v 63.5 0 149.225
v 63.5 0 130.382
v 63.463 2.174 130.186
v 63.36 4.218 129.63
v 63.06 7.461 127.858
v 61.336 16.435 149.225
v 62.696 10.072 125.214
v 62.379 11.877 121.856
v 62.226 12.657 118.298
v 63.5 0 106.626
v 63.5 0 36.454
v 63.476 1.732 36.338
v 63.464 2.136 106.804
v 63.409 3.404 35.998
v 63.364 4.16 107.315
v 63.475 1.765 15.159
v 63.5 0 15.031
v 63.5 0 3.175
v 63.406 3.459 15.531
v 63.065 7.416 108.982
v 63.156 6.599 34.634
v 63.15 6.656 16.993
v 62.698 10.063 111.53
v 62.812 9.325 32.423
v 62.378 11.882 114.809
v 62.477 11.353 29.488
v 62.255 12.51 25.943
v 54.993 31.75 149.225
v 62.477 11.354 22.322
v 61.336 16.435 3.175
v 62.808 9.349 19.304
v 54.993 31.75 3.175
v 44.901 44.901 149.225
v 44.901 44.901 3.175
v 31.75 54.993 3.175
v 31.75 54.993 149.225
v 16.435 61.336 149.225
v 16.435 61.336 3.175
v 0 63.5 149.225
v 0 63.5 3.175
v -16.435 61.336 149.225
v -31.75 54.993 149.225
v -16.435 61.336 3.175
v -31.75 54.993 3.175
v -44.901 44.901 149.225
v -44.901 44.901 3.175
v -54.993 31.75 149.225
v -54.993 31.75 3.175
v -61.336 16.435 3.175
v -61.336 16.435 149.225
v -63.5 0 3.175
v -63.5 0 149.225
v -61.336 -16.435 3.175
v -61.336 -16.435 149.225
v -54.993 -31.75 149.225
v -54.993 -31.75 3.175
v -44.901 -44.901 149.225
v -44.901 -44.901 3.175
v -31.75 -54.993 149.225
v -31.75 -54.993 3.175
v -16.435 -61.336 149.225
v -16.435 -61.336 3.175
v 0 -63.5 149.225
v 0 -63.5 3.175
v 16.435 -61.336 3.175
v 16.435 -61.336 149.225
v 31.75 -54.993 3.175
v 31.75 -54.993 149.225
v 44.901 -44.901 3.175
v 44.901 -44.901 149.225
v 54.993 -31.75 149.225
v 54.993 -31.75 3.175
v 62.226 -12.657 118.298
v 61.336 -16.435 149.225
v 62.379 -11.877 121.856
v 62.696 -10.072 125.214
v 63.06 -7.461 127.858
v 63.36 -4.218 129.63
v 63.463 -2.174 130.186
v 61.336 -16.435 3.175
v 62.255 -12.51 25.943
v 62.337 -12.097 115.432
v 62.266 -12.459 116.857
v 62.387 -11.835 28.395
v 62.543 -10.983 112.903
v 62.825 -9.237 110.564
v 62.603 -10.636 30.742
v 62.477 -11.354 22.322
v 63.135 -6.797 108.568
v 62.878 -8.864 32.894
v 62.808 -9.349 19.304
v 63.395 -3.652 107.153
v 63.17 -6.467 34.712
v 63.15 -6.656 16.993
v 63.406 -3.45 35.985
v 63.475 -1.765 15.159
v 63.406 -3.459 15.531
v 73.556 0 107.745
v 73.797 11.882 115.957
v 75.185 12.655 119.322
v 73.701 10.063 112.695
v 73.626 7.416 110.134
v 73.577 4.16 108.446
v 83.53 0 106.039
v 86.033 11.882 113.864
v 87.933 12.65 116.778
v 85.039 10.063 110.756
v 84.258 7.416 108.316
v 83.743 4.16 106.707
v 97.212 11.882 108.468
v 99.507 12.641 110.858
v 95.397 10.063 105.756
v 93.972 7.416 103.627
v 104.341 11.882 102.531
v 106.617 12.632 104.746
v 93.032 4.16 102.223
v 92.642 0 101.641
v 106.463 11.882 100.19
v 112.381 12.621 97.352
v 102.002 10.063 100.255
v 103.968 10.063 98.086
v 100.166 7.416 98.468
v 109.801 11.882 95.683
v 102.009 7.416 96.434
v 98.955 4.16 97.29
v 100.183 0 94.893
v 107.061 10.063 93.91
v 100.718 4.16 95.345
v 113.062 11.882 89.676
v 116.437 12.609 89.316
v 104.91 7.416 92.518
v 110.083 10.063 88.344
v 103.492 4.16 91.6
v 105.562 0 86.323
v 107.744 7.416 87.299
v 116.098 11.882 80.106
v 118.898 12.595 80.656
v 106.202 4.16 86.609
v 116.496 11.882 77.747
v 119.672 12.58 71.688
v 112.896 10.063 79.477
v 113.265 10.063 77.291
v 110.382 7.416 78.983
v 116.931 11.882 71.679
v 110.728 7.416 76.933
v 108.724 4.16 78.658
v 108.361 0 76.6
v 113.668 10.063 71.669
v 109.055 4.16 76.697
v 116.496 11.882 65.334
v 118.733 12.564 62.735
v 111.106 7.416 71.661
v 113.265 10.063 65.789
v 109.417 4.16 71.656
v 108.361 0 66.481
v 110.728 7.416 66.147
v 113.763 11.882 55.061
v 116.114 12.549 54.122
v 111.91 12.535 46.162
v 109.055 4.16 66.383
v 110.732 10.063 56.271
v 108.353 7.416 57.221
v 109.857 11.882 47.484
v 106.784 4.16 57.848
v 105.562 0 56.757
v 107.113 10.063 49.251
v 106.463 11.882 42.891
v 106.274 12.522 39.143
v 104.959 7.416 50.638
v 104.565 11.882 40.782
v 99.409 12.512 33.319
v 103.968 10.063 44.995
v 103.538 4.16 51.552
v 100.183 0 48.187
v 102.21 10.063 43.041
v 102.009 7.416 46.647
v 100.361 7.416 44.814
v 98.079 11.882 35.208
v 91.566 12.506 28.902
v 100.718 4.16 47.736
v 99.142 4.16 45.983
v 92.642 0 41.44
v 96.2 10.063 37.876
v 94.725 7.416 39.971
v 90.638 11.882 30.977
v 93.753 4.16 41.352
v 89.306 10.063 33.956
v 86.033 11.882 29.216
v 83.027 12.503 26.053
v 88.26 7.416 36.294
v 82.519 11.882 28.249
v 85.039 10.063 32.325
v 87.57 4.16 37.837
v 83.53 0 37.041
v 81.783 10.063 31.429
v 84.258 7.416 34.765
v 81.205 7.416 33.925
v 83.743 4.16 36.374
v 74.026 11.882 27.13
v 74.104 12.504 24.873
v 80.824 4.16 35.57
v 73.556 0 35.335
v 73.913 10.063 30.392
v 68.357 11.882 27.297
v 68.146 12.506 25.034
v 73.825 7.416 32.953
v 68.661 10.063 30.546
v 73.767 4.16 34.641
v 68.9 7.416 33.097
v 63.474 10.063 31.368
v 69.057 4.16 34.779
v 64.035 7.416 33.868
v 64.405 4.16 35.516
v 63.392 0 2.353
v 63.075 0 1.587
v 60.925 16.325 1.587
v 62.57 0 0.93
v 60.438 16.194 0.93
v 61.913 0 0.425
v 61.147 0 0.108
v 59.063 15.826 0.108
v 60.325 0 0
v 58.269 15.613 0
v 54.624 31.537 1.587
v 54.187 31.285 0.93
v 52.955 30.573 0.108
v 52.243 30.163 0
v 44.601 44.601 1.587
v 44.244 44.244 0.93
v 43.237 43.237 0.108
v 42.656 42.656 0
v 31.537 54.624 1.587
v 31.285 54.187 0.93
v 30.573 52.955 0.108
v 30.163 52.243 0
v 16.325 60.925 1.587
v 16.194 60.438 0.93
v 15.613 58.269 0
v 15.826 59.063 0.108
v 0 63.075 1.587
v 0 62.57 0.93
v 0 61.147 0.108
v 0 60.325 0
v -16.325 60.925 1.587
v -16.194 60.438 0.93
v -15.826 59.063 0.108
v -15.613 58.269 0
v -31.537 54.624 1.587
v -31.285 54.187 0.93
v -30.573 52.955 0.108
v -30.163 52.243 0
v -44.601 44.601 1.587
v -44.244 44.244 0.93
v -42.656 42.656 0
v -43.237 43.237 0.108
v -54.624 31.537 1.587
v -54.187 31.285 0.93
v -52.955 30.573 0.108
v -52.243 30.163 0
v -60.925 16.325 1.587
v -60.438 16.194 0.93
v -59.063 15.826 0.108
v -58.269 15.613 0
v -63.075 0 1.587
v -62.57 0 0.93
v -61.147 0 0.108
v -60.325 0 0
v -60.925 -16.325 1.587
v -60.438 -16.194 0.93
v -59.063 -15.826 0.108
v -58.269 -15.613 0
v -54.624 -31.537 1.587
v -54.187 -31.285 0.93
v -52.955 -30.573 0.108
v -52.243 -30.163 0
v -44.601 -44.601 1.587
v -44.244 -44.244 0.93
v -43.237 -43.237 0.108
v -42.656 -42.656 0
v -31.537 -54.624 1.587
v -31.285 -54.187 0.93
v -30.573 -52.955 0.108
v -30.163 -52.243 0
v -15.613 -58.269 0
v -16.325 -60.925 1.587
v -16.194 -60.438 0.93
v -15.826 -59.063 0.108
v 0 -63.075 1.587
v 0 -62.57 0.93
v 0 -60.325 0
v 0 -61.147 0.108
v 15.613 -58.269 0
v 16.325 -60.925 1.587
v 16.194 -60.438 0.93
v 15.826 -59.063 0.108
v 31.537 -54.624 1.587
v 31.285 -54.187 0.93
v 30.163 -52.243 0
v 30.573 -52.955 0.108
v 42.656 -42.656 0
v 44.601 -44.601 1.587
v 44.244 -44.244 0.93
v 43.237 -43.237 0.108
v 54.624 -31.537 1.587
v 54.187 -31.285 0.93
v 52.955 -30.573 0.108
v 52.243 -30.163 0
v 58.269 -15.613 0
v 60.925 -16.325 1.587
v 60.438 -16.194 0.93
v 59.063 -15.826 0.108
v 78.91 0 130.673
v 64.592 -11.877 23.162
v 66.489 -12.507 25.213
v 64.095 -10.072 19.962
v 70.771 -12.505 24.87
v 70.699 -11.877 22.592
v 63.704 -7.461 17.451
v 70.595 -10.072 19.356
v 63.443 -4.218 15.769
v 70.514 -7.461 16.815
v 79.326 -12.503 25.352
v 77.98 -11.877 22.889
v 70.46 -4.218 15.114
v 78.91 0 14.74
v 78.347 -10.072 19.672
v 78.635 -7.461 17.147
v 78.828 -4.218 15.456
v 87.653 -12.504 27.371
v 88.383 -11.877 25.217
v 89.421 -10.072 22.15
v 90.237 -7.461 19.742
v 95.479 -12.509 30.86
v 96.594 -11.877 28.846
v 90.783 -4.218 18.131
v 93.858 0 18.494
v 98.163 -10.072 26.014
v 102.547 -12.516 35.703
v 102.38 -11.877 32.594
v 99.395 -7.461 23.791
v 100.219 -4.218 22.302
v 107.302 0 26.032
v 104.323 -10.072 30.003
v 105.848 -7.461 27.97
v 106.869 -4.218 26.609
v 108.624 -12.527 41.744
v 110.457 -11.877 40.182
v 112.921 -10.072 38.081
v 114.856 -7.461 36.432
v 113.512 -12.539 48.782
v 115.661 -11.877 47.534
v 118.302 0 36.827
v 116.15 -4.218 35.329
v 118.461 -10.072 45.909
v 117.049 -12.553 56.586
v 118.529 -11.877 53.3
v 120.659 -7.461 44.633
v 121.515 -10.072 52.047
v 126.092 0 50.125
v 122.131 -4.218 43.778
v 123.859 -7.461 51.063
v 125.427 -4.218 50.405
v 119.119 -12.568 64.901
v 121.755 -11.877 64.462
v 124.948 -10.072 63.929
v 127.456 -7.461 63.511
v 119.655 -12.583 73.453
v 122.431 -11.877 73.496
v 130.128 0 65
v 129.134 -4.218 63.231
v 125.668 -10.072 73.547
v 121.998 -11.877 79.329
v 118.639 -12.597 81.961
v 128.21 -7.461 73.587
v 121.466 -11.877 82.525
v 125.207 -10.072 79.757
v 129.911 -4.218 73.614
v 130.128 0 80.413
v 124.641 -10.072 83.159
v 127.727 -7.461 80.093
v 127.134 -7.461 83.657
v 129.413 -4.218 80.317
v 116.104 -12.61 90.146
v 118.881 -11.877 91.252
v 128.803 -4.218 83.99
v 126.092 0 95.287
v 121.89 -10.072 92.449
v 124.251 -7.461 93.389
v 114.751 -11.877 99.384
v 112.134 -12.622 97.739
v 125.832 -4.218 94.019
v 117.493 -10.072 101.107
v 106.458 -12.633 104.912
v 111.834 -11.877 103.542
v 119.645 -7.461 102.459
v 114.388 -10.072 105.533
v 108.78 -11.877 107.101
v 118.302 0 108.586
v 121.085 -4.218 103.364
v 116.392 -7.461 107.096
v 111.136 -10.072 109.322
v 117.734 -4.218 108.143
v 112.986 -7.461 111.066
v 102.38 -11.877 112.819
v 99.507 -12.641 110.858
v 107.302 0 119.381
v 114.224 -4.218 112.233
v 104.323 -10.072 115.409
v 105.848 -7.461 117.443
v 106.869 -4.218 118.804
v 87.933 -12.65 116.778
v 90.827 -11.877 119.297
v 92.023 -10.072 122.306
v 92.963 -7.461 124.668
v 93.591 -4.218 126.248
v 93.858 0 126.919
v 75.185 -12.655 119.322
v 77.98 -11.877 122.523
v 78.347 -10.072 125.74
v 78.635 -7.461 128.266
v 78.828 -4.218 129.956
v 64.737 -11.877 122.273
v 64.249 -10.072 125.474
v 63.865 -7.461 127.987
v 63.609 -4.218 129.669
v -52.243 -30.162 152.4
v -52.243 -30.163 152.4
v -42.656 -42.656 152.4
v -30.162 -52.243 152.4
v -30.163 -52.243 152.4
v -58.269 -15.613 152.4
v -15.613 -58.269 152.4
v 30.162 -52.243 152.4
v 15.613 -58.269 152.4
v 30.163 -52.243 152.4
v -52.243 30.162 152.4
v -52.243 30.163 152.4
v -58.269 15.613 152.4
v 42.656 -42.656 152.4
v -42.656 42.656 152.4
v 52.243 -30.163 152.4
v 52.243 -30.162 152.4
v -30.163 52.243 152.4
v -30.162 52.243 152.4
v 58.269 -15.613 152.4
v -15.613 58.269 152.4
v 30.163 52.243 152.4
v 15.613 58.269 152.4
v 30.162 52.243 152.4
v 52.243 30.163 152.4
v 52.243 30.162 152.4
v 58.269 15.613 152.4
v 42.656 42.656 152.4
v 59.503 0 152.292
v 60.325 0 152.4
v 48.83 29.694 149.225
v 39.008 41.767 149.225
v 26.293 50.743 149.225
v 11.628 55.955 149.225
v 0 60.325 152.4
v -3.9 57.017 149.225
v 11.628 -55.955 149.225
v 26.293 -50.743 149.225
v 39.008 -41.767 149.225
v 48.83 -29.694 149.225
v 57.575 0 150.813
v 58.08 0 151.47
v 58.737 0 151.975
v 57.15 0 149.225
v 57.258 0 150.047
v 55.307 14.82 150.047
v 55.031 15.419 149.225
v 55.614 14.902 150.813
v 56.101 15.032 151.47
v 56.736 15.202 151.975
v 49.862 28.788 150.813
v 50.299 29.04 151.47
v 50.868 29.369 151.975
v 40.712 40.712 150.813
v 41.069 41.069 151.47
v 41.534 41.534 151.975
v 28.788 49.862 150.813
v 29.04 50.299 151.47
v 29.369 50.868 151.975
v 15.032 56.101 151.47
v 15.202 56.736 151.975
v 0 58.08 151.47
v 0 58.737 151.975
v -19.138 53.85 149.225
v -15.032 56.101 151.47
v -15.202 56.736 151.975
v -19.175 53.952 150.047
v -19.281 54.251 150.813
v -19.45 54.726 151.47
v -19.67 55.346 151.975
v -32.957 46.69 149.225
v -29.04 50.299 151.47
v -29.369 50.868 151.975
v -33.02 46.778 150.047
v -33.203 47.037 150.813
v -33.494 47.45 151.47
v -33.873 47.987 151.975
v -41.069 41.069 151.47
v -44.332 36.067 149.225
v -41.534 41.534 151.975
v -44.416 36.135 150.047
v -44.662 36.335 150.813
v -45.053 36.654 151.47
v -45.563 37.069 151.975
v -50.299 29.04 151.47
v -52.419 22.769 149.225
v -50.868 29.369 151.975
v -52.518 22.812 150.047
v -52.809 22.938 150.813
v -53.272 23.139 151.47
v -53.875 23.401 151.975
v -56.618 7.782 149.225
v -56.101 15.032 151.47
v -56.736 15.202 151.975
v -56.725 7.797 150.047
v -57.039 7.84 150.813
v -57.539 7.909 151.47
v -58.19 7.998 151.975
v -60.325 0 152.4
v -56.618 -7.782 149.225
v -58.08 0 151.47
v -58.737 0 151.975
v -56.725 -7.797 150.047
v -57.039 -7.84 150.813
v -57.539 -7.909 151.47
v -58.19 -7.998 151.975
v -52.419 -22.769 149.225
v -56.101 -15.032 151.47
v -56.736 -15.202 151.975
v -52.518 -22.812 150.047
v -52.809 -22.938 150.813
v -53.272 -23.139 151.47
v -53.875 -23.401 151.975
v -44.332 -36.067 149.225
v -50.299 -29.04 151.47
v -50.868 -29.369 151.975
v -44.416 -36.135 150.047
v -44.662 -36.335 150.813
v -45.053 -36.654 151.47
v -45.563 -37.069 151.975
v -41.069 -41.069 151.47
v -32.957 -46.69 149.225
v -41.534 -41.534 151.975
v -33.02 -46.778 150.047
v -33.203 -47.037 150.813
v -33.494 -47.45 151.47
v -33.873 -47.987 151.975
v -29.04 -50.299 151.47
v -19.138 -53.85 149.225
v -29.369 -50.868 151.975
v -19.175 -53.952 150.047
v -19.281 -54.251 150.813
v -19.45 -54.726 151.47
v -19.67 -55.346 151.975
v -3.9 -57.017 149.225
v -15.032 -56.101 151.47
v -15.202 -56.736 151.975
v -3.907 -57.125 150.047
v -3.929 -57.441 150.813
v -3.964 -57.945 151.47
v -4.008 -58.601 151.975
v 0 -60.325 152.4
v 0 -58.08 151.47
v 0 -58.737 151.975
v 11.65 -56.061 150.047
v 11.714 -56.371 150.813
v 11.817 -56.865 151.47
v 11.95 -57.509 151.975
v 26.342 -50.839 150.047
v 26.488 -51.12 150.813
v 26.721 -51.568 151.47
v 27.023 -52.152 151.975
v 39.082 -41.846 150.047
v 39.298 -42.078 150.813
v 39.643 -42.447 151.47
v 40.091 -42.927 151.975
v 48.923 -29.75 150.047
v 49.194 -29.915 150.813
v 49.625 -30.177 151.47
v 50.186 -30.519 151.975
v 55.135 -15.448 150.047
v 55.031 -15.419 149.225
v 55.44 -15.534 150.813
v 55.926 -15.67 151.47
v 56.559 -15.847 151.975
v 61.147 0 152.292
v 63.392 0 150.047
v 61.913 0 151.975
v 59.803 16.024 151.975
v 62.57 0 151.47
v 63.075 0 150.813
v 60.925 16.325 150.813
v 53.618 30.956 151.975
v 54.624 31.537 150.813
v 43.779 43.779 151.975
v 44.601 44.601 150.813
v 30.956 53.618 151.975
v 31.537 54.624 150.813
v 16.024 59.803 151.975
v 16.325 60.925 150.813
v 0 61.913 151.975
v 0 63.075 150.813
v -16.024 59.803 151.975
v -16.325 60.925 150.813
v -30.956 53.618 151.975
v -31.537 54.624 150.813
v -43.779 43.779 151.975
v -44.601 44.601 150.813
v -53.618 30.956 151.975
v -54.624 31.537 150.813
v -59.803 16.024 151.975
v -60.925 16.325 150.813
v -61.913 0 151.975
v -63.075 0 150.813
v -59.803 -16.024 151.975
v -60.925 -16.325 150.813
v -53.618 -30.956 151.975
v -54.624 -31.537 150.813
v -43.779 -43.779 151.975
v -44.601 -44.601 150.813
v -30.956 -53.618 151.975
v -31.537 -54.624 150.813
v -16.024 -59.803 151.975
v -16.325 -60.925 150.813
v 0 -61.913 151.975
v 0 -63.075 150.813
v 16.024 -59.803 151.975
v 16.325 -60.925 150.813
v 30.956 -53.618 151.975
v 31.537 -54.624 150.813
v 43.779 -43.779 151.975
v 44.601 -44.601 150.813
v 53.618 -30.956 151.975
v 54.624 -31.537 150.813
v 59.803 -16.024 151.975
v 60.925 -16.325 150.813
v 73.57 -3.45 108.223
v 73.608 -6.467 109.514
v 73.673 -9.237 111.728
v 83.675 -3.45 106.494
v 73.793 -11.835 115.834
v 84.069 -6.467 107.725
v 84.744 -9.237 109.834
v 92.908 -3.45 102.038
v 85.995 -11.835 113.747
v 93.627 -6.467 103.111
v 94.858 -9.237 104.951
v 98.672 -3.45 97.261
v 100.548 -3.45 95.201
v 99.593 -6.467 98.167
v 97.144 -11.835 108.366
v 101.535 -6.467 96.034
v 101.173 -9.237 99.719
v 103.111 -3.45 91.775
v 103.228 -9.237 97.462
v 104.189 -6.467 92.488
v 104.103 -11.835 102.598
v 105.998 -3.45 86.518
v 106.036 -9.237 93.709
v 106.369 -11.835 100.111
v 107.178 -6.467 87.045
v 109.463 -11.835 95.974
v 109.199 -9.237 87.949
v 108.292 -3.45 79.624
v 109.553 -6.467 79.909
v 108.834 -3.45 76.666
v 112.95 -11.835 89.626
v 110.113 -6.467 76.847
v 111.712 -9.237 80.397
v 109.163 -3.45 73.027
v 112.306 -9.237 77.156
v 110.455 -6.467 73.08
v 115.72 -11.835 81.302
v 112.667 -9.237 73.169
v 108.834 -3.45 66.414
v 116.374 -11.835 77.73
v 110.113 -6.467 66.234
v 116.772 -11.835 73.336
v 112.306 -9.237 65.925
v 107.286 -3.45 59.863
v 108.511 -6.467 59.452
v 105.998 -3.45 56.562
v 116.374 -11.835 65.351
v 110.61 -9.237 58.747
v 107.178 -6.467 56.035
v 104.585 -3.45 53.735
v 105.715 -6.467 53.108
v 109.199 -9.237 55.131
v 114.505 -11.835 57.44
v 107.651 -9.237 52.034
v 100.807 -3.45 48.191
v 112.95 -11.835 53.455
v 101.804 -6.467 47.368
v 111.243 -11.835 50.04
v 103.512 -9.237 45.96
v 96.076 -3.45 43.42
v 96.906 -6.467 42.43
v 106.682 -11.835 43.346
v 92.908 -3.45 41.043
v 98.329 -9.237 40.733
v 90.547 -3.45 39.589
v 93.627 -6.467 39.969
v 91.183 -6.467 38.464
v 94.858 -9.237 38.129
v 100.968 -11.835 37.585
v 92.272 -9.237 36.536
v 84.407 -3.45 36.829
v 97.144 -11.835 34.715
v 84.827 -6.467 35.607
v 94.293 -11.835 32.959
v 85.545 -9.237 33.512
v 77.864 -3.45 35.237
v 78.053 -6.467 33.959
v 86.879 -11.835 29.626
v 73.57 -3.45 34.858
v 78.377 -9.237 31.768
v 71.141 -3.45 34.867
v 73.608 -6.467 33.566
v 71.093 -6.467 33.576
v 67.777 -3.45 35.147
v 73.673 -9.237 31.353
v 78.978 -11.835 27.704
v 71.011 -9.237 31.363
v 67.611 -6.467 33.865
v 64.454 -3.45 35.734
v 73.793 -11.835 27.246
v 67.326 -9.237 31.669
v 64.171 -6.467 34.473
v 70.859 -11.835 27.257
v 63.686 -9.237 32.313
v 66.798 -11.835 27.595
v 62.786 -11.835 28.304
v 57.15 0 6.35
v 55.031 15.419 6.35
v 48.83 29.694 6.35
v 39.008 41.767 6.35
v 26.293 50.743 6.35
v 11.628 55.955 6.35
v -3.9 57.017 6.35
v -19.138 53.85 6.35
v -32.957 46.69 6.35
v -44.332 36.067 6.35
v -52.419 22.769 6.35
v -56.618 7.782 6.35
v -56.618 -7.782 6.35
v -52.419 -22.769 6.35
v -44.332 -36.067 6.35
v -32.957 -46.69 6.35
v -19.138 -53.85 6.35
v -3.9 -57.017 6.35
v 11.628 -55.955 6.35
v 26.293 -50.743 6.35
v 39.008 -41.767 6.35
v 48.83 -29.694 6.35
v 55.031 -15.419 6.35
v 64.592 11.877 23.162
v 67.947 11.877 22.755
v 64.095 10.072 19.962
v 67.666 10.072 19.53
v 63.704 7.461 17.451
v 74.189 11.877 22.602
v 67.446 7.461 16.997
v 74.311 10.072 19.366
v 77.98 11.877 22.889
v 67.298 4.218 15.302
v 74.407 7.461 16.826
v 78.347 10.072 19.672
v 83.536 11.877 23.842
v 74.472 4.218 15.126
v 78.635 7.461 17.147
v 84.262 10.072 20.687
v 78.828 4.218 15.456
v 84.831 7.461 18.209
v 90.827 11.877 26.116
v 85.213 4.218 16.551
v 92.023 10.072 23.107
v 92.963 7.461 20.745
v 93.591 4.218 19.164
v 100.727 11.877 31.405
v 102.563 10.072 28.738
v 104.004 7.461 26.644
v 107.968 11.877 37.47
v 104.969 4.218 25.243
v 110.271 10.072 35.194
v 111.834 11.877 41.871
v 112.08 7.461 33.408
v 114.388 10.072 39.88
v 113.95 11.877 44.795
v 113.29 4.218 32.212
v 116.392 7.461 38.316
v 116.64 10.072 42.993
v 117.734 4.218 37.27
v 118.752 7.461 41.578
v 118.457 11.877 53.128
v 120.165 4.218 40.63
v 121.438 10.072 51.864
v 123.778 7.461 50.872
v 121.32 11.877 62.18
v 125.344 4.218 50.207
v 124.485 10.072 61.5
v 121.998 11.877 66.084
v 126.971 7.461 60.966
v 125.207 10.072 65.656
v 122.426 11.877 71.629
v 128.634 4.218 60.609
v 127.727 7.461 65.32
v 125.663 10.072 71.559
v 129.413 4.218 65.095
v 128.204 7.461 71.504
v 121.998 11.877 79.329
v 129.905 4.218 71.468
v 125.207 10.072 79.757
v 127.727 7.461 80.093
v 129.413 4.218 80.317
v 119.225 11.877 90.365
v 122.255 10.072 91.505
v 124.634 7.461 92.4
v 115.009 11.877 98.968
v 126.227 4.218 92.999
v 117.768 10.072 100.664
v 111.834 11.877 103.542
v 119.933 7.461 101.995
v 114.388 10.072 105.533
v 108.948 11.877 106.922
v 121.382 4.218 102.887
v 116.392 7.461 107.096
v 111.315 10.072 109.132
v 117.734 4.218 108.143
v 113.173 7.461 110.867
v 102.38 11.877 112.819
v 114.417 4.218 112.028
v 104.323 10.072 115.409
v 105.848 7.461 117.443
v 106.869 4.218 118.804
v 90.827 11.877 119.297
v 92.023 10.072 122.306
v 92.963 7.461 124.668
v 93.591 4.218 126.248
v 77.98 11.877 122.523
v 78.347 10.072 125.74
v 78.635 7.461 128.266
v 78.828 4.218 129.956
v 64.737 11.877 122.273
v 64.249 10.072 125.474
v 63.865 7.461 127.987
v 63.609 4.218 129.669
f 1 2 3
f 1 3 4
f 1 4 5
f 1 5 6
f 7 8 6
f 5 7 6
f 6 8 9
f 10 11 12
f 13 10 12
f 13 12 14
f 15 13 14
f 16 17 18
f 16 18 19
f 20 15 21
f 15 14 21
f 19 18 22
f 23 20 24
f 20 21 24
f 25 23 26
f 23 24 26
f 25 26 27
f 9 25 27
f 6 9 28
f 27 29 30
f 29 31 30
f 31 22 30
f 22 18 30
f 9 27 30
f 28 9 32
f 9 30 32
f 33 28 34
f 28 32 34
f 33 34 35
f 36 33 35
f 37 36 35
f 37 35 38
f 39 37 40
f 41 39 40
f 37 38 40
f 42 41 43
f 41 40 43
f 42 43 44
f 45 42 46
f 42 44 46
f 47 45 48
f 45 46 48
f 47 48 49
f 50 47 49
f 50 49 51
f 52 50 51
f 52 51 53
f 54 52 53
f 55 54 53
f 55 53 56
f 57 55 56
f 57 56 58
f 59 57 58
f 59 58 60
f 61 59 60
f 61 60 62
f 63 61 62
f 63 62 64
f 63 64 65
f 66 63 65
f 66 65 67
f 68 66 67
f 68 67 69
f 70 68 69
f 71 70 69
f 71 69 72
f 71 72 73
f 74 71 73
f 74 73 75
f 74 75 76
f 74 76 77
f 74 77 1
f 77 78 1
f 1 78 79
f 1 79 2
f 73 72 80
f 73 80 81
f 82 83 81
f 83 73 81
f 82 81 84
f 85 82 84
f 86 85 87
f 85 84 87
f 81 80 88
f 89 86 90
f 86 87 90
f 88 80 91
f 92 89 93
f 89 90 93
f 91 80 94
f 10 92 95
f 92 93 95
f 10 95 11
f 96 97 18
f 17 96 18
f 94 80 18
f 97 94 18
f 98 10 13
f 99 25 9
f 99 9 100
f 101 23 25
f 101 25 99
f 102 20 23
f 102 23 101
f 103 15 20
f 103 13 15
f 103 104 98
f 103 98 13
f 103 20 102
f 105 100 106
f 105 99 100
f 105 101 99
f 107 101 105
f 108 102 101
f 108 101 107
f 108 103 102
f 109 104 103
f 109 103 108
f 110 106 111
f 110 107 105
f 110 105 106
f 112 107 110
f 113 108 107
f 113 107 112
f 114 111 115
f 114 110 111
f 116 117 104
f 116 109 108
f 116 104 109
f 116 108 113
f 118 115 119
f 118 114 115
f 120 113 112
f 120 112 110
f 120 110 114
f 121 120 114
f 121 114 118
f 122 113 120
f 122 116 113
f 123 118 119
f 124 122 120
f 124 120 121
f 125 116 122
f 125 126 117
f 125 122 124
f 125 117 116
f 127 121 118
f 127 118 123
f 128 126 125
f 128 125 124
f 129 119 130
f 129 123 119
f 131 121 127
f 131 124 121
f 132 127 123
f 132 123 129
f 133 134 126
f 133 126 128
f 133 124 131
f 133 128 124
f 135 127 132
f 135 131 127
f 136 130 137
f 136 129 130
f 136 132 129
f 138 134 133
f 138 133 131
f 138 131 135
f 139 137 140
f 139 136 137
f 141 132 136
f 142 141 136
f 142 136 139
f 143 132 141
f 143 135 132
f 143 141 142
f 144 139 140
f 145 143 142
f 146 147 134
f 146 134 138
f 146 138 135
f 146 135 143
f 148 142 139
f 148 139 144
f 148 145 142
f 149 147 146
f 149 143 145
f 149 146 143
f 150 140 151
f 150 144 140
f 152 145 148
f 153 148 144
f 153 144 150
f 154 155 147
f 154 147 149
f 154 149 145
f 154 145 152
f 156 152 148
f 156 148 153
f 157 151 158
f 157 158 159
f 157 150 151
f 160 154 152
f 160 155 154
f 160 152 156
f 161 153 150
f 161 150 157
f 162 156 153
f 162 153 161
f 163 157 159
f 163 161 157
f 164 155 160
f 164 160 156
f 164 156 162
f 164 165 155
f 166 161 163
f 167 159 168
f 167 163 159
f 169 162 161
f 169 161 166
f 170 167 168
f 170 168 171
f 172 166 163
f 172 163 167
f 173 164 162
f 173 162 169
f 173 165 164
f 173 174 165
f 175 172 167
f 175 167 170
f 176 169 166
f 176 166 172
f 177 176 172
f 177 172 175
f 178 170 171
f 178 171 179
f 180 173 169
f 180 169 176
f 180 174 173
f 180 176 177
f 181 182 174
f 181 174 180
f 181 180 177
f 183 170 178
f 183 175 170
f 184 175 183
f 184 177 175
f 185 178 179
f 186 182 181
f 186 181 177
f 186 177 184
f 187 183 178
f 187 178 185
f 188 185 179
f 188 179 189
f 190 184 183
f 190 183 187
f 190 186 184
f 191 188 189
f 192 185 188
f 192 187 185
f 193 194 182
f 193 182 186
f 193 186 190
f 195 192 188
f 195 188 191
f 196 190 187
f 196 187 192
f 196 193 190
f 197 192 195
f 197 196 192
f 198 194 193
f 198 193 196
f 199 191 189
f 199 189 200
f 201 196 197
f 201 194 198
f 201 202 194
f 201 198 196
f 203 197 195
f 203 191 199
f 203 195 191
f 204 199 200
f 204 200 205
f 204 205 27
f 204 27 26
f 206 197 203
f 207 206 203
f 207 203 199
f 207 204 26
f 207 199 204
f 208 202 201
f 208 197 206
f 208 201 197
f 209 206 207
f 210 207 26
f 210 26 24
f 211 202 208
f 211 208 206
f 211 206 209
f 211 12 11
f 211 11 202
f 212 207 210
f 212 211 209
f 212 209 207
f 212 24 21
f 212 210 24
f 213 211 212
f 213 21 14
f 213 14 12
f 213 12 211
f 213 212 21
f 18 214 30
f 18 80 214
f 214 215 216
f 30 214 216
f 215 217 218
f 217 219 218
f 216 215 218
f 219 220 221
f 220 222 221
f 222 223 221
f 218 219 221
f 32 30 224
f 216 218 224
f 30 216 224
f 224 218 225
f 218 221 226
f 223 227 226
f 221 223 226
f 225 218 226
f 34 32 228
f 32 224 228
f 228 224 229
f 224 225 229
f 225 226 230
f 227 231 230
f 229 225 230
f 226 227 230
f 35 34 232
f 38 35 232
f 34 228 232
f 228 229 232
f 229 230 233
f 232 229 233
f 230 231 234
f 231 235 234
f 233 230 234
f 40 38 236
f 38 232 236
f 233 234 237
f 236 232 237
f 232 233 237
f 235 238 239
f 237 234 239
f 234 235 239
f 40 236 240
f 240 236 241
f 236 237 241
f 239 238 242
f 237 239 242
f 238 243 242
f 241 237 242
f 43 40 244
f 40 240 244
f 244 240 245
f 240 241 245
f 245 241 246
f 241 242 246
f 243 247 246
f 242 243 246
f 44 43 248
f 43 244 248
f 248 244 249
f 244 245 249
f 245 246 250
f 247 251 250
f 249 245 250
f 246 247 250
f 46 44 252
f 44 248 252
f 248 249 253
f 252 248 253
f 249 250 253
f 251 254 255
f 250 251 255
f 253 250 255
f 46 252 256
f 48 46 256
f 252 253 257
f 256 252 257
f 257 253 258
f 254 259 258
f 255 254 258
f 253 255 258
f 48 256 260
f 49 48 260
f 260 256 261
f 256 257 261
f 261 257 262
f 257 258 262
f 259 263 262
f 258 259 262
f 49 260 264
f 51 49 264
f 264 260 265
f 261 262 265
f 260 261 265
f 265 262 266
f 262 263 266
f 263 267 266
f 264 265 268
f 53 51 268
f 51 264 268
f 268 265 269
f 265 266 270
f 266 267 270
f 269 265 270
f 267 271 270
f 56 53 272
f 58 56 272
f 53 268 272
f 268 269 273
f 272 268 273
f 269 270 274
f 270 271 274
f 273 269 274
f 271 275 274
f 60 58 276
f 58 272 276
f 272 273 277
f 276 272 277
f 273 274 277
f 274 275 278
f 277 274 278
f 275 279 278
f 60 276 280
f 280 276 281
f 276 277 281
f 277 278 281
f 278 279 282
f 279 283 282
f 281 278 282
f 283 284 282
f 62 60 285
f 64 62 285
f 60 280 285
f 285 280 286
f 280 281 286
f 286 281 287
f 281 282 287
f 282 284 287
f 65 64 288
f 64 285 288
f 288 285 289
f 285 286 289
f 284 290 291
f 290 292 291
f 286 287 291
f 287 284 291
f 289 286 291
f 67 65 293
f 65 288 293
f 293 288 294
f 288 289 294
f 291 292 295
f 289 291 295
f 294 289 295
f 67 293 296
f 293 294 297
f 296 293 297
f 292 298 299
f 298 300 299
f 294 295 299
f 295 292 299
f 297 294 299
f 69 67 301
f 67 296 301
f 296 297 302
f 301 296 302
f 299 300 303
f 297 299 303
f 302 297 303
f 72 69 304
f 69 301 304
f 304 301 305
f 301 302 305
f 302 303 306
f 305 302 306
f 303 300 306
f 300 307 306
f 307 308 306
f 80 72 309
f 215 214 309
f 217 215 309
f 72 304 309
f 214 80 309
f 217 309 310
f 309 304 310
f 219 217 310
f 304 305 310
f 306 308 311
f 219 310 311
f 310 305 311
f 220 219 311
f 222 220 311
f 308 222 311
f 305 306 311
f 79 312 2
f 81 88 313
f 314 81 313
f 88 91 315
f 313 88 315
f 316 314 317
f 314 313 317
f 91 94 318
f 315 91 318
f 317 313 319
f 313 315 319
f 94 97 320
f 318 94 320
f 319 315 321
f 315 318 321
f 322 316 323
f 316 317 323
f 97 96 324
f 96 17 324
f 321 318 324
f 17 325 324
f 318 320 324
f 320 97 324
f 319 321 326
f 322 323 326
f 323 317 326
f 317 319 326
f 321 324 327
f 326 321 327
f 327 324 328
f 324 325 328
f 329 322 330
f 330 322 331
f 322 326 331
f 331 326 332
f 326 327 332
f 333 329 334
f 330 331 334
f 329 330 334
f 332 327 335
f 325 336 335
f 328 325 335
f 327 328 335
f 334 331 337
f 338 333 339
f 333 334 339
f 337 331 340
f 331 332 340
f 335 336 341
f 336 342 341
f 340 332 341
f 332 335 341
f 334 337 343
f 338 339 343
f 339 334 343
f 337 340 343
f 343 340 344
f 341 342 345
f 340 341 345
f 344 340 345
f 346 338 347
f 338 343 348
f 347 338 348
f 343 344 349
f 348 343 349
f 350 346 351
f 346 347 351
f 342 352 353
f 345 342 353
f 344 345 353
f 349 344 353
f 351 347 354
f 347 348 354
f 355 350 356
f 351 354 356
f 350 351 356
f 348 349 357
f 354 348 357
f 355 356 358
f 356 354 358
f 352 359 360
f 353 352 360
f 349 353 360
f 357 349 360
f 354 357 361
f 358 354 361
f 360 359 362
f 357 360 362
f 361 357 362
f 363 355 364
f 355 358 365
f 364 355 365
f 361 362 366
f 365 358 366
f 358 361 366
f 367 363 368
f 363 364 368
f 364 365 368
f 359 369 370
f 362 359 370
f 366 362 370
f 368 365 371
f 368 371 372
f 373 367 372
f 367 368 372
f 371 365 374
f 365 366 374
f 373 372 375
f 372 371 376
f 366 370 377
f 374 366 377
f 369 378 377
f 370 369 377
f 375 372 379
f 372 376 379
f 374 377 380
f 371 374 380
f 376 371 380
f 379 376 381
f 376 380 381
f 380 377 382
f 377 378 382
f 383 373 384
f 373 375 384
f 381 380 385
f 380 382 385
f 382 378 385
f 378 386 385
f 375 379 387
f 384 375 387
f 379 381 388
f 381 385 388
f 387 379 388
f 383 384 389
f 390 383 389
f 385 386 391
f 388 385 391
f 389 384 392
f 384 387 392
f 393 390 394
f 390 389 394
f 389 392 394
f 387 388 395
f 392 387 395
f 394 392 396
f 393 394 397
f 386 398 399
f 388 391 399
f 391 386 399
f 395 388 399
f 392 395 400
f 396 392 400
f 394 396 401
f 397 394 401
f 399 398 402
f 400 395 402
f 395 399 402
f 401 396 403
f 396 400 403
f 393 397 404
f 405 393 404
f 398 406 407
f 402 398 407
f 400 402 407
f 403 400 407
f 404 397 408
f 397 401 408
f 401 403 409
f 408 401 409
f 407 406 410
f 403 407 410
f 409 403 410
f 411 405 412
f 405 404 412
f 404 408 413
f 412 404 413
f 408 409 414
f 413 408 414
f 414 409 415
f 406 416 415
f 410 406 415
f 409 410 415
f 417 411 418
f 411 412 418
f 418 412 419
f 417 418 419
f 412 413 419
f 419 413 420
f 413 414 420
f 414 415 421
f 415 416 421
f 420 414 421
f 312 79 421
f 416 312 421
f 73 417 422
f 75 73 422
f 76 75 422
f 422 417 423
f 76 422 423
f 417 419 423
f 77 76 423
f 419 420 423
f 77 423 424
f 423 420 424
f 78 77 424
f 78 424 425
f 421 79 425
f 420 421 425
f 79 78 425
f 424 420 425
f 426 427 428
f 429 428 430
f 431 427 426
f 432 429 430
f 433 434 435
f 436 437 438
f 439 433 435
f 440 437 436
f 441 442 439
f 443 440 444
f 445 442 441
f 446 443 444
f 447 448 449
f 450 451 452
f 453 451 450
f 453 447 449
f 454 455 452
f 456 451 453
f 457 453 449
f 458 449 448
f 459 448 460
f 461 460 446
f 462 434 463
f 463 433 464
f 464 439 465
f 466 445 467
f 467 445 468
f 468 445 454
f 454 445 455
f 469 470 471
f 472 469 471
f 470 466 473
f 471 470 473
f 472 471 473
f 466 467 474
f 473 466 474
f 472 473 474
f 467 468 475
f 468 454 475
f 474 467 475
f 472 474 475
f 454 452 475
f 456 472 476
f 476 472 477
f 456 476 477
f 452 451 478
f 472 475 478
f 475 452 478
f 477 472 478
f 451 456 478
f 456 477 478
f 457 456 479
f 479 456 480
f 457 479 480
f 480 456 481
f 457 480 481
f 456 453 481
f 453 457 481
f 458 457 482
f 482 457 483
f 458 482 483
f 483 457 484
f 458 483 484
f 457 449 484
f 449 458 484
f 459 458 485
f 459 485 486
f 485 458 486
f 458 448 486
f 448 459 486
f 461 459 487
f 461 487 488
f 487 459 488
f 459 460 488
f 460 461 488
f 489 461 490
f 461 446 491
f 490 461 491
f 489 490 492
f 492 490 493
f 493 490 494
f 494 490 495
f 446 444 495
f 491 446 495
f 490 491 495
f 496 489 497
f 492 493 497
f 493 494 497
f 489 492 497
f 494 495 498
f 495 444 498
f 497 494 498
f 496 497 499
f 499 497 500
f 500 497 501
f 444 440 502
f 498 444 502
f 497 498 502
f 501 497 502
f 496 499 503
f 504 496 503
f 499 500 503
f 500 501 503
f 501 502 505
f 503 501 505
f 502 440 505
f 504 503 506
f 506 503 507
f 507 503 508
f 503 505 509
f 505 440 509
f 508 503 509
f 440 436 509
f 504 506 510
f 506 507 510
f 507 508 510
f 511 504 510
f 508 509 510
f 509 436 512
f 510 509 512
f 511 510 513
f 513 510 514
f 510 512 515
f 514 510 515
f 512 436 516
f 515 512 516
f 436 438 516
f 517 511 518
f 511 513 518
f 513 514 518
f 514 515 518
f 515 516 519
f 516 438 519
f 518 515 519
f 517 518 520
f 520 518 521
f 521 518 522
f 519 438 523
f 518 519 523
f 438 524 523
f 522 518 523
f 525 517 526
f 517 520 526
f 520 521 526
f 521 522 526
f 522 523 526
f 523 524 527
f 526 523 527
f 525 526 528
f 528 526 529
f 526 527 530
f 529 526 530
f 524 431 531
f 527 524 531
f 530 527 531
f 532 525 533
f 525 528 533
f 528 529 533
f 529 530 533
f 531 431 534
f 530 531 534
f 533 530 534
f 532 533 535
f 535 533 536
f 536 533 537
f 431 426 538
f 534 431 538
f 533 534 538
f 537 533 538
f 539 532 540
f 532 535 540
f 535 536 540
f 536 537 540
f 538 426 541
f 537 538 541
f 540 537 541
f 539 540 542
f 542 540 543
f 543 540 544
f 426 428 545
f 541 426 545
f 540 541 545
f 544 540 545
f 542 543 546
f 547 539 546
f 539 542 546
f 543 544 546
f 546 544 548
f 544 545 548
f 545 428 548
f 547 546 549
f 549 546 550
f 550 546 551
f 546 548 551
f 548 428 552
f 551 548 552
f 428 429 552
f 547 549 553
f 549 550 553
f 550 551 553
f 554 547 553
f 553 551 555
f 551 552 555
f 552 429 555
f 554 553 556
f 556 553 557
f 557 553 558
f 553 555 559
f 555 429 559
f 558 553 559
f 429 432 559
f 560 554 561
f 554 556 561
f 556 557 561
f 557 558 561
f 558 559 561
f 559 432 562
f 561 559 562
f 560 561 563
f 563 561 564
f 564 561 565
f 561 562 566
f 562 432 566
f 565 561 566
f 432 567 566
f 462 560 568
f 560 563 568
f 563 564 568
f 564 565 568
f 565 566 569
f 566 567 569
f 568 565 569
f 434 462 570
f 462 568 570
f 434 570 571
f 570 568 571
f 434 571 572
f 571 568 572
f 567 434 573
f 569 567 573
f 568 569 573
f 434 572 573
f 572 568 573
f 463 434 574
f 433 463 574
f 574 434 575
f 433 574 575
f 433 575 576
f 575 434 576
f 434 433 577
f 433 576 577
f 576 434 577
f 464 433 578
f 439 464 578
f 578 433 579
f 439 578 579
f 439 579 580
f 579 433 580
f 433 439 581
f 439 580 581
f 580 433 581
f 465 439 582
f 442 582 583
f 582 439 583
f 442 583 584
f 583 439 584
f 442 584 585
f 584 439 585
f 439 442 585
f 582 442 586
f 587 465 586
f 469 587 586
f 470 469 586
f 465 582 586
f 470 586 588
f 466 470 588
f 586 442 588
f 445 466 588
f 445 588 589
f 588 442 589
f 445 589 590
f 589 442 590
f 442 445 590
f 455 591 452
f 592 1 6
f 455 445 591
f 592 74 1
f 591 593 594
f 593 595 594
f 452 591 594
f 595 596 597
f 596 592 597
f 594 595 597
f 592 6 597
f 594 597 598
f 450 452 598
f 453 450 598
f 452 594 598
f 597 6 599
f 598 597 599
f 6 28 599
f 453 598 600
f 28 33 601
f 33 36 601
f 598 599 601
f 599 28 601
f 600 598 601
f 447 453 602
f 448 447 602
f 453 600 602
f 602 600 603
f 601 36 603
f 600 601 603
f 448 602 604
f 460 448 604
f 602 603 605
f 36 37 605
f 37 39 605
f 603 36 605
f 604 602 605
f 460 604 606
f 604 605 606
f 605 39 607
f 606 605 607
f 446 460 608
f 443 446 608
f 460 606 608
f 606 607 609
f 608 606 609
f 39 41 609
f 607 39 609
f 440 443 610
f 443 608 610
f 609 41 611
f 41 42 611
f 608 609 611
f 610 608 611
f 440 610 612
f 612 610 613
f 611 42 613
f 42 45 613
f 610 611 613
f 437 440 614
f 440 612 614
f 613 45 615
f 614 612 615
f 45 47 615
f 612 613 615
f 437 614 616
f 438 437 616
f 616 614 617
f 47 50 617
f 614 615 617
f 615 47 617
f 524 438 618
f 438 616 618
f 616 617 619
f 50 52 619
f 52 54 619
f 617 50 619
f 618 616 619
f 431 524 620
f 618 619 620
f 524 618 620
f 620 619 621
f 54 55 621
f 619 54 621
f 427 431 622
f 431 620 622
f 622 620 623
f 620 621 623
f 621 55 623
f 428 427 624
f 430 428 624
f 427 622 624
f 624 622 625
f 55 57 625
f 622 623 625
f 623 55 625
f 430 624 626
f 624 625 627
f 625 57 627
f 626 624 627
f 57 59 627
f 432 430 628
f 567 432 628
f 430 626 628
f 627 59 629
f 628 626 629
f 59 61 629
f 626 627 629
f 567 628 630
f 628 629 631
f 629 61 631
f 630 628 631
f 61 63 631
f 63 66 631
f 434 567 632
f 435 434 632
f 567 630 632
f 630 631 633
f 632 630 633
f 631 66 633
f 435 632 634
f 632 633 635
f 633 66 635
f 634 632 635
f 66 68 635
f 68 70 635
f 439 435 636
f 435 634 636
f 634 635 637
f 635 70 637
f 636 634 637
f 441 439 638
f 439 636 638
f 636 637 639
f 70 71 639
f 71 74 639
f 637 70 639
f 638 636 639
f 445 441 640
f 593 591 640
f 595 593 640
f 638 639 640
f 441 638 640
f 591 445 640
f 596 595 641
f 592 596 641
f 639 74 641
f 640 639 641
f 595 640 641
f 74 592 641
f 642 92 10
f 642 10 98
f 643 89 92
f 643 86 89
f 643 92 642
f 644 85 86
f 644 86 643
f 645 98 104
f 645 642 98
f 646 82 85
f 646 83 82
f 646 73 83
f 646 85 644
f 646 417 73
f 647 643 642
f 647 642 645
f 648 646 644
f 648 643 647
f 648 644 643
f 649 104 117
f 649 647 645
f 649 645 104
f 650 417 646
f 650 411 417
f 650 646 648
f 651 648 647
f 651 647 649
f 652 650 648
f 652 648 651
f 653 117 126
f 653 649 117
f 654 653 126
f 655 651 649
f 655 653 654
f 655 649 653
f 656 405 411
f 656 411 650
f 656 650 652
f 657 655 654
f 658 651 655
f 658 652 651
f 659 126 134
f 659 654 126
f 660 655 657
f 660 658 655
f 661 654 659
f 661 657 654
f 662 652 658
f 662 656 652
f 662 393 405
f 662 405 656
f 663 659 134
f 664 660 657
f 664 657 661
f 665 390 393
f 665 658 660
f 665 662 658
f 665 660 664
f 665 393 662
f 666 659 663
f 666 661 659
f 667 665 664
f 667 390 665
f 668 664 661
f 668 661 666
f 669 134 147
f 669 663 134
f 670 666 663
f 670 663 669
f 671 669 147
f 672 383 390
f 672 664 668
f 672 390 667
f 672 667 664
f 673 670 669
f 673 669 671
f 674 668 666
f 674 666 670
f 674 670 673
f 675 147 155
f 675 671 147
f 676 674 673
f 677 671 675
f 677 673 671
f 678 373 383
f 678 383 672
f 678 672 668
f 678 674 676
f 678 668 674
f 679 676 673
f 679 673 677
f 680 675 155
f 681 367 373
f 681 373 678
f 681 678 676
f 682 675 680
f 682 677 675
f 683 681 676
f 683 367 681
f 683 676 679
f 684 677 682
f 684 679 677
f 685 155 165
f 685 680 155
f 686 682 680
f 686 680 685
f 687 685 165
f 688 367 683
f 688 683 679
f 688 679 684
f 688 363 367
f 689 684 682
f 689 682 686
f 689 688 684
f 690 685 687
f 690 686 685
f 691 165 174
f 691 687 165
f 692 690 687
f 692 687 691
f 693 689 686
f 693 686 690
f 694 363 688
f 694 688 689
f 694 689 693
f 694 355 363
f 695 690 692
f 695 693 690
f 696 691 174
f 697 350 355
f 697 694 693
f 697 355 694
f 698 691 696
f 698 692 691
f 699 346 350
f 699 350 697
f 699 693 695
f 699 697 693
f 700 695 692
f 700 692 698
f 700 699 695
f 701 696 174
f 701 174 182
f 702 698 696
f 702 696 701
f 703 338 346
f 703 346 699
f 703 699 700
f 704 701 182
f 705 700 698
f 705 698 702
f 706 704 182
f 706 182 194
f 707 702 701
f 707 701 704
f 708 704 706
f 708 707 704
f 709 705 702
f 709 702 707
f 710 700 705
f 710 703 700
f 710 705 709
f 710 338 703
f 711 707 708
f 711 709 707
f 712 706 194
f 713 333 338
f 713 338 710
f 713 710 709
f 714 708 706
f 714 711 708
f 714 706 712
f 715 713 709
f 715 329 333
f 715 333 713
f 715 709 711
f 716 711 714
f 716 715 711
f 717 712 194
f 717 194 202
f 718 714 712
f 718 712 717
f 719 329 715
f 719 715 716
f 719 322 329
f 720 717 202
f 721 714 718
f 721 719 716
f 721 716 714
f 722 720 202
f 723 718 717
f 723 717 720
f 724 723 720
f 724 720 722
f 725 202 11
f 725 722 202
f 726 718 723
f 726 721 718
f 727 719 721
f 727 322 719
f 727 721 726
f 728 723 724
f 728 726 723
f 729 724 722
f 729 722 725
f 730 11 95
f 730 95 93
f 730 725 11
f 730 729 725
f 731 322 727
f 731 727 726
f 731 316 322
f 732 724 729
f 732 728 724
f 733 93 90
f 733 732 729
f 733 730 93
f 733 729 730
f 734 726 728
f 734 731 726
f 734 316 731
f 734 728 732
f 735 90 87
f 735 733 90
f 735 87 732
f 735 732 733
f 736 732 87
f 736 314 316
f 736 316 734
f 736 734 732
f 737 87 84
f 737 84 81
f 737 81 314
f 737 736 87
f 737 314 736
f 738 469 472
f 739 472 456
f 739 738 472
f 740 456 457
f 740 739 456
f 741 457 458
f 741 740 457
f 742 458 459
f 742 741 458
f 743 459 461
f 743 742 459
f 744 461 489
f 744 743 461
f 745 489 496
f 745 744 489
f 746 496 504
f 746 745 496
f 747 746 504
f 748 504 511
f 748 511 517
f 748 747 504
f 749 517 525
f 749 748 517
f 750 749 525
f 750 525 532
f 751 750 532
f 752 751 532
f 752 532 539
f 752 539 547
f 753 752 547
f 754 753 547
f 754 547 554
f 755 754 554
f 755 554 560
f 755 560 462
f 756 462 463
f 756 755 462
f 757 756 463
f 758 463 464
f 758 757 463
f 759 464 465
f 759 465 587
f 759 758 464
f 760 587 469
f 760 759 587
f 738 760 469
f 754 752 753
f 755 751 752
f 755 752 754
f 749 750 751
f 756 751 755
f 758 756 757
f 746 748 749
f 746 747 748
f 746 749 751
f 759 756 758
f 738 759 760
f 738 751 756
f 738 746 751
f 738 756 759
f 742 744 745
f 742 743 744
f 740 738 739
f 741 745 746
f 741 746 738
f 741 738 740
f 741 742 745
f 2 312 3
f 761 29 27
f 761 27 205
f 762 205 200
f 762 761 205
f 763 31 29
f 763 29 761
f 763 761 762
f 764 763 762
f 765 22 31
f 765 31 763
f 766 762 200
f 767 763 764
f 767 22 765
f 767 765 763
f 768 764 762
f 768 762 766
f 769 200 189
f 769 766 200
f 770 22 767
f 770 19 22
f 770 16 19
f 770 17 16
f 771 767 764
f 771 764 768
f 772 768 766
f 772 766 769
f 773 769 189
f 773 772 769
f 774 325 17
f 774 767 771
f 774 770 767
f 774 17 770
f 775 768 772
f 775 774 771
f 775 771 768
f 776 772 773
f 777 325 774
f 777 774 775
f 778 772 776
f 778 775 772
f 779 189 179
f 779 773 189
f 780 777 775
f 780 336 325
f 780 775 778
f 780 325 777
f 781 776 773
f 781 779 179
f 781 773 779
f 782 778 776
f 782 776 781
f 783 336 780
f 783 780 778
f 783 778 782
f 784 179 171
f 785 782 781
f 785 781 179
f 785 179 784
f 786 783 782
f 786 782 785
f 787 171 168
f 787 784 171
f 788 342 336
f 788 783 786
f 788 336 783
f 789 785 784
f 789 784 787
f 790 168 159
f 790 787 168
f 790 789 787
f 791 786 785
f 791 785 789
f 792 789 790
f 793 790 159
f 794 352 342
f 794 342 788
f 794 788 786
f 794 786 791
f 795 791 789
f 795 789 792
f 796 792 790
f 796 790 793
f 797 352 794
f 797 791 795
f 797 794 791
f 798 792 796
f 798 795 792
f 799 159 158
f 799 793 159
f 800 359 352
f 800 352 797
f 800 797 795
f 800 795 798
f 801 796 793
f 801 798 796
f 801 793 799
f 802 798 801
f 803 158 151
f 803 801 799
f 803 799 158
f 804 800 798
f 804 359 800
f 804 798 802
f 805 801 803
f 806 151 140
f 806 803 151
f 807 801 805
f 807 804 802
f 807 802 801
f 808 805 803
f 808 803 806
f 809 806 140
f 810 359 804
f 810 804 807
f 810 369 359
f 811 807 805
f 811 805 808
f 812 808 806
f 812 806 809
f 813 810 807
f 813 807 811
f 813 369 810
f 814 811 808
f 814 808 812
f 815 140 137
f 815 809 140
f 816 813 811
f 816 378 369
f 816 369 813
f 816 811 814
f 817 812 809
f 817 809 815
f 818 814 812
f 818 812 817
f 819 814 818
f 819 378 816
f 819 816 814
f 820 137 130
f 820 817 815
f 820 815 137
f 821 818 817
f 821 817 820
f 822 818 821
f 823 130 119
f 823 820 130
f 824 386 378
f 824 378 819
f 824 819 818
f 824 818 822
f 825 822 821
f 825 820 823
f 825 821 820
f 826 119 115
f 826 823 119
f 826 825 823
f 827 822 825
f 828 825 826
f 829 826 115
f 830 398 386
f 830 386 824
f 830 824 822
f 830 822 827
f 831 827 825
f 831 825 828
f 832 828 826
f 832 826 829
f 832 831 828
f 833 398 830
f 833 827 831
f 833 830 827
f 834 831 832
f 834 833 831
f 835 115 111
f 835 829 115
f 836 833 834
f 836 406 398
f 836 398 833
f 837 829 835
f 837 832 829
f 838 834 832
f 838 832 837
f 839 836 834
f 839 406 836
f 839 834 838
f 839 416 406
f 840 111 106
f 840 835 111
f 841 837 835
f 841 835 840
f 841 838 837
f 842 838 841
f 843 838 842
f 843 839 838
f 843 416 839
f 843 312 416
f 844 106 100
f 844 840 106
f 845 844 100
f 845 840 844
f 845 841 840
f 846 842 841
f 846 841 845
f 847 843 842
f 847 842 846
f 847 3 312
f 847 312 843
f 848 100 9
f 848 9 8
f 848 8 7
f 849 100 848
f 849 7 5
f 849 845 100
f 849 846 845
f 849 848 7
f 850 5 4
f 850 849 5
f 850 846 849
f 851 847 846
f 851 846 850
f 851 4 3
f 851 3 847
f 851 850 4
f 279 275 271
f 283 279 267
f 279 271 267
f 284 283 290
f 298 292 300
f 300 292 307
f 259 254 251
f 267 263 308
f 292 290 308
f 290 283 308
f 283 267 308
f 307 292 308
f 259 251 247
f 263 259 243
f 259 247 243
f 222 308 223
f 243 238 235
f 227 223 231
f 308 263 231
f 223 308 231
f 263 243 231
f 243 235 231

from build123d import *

# Parameters (mm, degrees)
F0_R         = 63.5
F2_DEPTH     = 152.4
F3_T         = -6.35
F4_DEPTH     = 12.7
F5_DEPTH     = 152.4
F6_T4_ANGLE  = 262.3827679328
F6_S5_R      = 63.5
F6_T6_DEPTH  = 84
F6_T10_ANGLE = 262.3827679328
F6_S11_R     = 63.5
F6_T12_DEPTH = 84
F6_T16_ANGLE = 313.645065155
F6_S17_R     = 63.5
F6_T18_DEPTH = 84
F6_T22_ANGLE = 313.645065155
F6_S23_R     = 63.5
F6_T24_DEPTH = 84
F7_R         = 3.17499


# Not quite as in the source:
# - a fillet or chamfer that OpenCascade refuses, or shapes differently, is made with other operations: its cross-section is extruded or revolved along the edge and cut away or added
# - a fillet or chamfer is up to 0.001 mm smaller than in the source, because OpenCascade refuses the exact size


with BuildPart() as f2:
    # F0 (on Top) → F2 (new body)
    with BuildSketch(Plane.XY):
        Circle(F0_R)
    extrude(amount=F2_DEPTH)

    # F3
    f3_openings = [f2.faces().sort_by_distance(p)[0] for p in [
        (0, 0, 152.4),
    ]]
    offset(amount=F3_T, openings=f3_openings)

    # F1 (on Front) → F4 (join, symmetric)
    with BuildSketch(Plane.XZ):
        with BuildLine():
            Line((49.501311034, 43.5545518994), (49.501311034, 19.0017146287))
            ThreePointArc((49.501311034, 19.0017146287), (130.6394136759, 72.7063623934), (49.5013073087, 126.4110045299))
            Line((49.5013073087, 126.4110045299), (49.5013073087, 99.5260253549))
            ThreePointArc((49.5013073087, 99.5260253549), (108.7160258507, 71.5402925683), (49.501311034, 43.5545518994))
        make_face()
    extrude(amount=F4_DEPTH, both=True)

    # F5 (cut): a face of the model
    f5_faces = [f2.faces().sort_by_distance(p)[0] for p in [
        (0, 0, 6.35),
    ]]
    extrude(f5_faces, amount=F5_DEPTH, mode=Mode.SUBTRACT)

    # F6: fillet of radius 12.7 on 4 edges, made by hand


with BuildPart() as f6_tool2:
    # F6_s3 → F6_t4 (revolve)
    with BuildSketch(Plane(origin=(4.9077736373, 0, -4.2951275785), x_dir=(0, 1, 0), z_dir=(-0.7525139529, 0, 0.6585763059))):
        with BuildLine():
            ThreePointArc((-12.7, -56.6832774583), (-8.9802561211, -47.7030213372), (0, -43.9832774583))
            Line((0, -43.9832774583), (0, -43.7292774583))
            Line((0, -43.7292774583), (-12.954, -43.7292774583))
            Line((-12.954, -43.7292774583), (-12.954, -56.6832774583))
            Line((-12.954, -56.6832774583), (-12.7, -56.6832774583))
        make_face()
    revolve(axis=Axis((72.2970297265, -12.7, 72.7063603699), (0, -1, 0)), revolution_arc=F6_T4_ANGLE)

    # F6_s5 → F6_t6 (cut, symmetric)
    with BuildSketch(Plane.XY.offset(72.7)):
        Circle(F6_S5_R)
    extrude(amount=F6_T6_DEPTH, both=True, mode=Mode.SUBTRACT)


with BuildPart() as f2_1:
    add(f2.part)

    # F6_t1: cut F6_tool2
    add(f6_tool2.part, mode=Mode.SUBTRACT)


with BuildPart() as f6_tool8:
    # F6_s9 → F6_t10 (revolve)
    with BuildSketch(Plane(origin=(4.9077736373, 0, -4.2951275785), x_dir=(0, 1, 0), z_dir=(-0.7525139529, 0, 0.6585763059))):
        with BuildLine():
            ThreePointArc((12.7, -56.6832774583), (8.9802561211, -47.7030213372), (0, -43.9832774583))
            Line((0, -43.9832774583), (0, -43.7292774583))
            Line((0, -43.7292774583), (12.954, -43.7292774583))
            Line((12.954, -43.7292774583), (12.954, -56.6832774583))
            Line((12.954, -56.6832774583), (12.7, -56.6832774583))
        make_face()
    revolve(axis=Axis((72.2970297265, 12.7, 72.7063603699), (0, -1, 0)), revolution_arc=F6_T10_ANGLE)

    # F6_s11 → F6_t12 (cut, symmetric)
    with BuildSketch(Plane.XY.offset(72.7)):
        Circle(F6_S11_R)
    extrude(amount=F6_T12_DEPTH, both=True, mode=Mode.SUBTRACT)


with BuildPart() as f2_2:
    add(f2_1.part)

    # F6_t7: cut F6_tool8
    add(f6_tool8.part, mode=Mode.SUBTRACT)


with BuildPart() as f6_tool14:
    # F6_s15 → F6_t16 (revolve)
    with BuildSketch(Plane(origin=(37.1142669501, 0, 86.6882103357), x_dir=(0, 1, 0), z_dir=(-0.3935804129, 0, -0.9192901928))):
        with BuildLine():
            ThreePointArc((0, 2.2668933091), (-8.9802561211, -1.4528505698), (-12.7, -10.4331066909))
            Line((-12.7, -10.4331066909), (-12.954, -10.4331066909))
            Line((-12.954, -10.4331066909), (-12.954, 2.5208933091))
            Line((-12.954, 2.5208933091), (0, 2.5208933091))
            Line((0, 2.5208933091), (0, 2.2668933091))
        make_face()
    revolve(axis=Axis((72.495434314, -12.7, 71.5402901576), (0, 1, 0)), revolution_arc=F6_T16_ANGLE)

    # F6_s17 → F6_t18 (cut, symmetric)
    with BuildSketch(Plane.XY.offset(71.5)):
        Circle(F6_S17_R)
    extrude(amount=F6_T18_DEPTH, both=True, mode=Mode.SUBTRACT)


with BuildPart() as f2_3:
    add(f2_2.part)

    # F6_t13: cut F6_tool14
    add(f6_tool14.part, mode=Mode.SUBTRACT)


with BuildPart() as f6_tool20:
    # F6_s21 → F6_t22 (revolve)
    with BuildSketch(Plane(origin=(37.1142669501, 0, 86.6882103357), x_dir=(0, 1, 0), z_dir=(-0.3935804129, 0, -0.9192901928))):
        with BuildLine():
            ThreePointArc((12.7, -10.4331066909), (8.9802561211, -1.4528505698), (0, 2.2668933091))
            Line((0, 2.2668933091), (0, 2.5208933091))
            Line((0, 2.5208933091), (12.954, 2.5208933091))
            Line((12.954, 2.5208933091), (12.954, -10.4331066909))
            Line((12.954, -10.4331066909), (12.7, -10.4331066909))
        make_face()
    revolve(axis=Axis((72.495434314, 12.7, 71.5402901576), (0, 1, 0)), revolution_arc=F6_T22_ANGLE)

    # F6_s23 → F6_t24 (cut, symmetric)
    with BuildSketch(Plane.XY.offset(71.5)):
        Circle(F6_S23_R)
    extrude(amount=F6_T24_DEPTH, both=True, mode=Mode.SUBTRACT)


with BuildPart() as f2_4:
    add(f2_3.part)

    # F6_t19: cut F6_tool20
    add(f6_tool20.part, mode=Mode.SUBTRACT)

    # F7 (radius 3.175 in the source; OpenCascade refuses exactly that, so slightly less here)
    f7_edges = [f2_4.edges().sort_by_distance(p)[0] for p in [
        (-63.5, 0, 152.4),
        (-57.15, 0, 152.4),
        (-63.5, 0, 0),
    ]]
    fillet(f7_edges, radius=F7_R)


solid = f2_4.part
